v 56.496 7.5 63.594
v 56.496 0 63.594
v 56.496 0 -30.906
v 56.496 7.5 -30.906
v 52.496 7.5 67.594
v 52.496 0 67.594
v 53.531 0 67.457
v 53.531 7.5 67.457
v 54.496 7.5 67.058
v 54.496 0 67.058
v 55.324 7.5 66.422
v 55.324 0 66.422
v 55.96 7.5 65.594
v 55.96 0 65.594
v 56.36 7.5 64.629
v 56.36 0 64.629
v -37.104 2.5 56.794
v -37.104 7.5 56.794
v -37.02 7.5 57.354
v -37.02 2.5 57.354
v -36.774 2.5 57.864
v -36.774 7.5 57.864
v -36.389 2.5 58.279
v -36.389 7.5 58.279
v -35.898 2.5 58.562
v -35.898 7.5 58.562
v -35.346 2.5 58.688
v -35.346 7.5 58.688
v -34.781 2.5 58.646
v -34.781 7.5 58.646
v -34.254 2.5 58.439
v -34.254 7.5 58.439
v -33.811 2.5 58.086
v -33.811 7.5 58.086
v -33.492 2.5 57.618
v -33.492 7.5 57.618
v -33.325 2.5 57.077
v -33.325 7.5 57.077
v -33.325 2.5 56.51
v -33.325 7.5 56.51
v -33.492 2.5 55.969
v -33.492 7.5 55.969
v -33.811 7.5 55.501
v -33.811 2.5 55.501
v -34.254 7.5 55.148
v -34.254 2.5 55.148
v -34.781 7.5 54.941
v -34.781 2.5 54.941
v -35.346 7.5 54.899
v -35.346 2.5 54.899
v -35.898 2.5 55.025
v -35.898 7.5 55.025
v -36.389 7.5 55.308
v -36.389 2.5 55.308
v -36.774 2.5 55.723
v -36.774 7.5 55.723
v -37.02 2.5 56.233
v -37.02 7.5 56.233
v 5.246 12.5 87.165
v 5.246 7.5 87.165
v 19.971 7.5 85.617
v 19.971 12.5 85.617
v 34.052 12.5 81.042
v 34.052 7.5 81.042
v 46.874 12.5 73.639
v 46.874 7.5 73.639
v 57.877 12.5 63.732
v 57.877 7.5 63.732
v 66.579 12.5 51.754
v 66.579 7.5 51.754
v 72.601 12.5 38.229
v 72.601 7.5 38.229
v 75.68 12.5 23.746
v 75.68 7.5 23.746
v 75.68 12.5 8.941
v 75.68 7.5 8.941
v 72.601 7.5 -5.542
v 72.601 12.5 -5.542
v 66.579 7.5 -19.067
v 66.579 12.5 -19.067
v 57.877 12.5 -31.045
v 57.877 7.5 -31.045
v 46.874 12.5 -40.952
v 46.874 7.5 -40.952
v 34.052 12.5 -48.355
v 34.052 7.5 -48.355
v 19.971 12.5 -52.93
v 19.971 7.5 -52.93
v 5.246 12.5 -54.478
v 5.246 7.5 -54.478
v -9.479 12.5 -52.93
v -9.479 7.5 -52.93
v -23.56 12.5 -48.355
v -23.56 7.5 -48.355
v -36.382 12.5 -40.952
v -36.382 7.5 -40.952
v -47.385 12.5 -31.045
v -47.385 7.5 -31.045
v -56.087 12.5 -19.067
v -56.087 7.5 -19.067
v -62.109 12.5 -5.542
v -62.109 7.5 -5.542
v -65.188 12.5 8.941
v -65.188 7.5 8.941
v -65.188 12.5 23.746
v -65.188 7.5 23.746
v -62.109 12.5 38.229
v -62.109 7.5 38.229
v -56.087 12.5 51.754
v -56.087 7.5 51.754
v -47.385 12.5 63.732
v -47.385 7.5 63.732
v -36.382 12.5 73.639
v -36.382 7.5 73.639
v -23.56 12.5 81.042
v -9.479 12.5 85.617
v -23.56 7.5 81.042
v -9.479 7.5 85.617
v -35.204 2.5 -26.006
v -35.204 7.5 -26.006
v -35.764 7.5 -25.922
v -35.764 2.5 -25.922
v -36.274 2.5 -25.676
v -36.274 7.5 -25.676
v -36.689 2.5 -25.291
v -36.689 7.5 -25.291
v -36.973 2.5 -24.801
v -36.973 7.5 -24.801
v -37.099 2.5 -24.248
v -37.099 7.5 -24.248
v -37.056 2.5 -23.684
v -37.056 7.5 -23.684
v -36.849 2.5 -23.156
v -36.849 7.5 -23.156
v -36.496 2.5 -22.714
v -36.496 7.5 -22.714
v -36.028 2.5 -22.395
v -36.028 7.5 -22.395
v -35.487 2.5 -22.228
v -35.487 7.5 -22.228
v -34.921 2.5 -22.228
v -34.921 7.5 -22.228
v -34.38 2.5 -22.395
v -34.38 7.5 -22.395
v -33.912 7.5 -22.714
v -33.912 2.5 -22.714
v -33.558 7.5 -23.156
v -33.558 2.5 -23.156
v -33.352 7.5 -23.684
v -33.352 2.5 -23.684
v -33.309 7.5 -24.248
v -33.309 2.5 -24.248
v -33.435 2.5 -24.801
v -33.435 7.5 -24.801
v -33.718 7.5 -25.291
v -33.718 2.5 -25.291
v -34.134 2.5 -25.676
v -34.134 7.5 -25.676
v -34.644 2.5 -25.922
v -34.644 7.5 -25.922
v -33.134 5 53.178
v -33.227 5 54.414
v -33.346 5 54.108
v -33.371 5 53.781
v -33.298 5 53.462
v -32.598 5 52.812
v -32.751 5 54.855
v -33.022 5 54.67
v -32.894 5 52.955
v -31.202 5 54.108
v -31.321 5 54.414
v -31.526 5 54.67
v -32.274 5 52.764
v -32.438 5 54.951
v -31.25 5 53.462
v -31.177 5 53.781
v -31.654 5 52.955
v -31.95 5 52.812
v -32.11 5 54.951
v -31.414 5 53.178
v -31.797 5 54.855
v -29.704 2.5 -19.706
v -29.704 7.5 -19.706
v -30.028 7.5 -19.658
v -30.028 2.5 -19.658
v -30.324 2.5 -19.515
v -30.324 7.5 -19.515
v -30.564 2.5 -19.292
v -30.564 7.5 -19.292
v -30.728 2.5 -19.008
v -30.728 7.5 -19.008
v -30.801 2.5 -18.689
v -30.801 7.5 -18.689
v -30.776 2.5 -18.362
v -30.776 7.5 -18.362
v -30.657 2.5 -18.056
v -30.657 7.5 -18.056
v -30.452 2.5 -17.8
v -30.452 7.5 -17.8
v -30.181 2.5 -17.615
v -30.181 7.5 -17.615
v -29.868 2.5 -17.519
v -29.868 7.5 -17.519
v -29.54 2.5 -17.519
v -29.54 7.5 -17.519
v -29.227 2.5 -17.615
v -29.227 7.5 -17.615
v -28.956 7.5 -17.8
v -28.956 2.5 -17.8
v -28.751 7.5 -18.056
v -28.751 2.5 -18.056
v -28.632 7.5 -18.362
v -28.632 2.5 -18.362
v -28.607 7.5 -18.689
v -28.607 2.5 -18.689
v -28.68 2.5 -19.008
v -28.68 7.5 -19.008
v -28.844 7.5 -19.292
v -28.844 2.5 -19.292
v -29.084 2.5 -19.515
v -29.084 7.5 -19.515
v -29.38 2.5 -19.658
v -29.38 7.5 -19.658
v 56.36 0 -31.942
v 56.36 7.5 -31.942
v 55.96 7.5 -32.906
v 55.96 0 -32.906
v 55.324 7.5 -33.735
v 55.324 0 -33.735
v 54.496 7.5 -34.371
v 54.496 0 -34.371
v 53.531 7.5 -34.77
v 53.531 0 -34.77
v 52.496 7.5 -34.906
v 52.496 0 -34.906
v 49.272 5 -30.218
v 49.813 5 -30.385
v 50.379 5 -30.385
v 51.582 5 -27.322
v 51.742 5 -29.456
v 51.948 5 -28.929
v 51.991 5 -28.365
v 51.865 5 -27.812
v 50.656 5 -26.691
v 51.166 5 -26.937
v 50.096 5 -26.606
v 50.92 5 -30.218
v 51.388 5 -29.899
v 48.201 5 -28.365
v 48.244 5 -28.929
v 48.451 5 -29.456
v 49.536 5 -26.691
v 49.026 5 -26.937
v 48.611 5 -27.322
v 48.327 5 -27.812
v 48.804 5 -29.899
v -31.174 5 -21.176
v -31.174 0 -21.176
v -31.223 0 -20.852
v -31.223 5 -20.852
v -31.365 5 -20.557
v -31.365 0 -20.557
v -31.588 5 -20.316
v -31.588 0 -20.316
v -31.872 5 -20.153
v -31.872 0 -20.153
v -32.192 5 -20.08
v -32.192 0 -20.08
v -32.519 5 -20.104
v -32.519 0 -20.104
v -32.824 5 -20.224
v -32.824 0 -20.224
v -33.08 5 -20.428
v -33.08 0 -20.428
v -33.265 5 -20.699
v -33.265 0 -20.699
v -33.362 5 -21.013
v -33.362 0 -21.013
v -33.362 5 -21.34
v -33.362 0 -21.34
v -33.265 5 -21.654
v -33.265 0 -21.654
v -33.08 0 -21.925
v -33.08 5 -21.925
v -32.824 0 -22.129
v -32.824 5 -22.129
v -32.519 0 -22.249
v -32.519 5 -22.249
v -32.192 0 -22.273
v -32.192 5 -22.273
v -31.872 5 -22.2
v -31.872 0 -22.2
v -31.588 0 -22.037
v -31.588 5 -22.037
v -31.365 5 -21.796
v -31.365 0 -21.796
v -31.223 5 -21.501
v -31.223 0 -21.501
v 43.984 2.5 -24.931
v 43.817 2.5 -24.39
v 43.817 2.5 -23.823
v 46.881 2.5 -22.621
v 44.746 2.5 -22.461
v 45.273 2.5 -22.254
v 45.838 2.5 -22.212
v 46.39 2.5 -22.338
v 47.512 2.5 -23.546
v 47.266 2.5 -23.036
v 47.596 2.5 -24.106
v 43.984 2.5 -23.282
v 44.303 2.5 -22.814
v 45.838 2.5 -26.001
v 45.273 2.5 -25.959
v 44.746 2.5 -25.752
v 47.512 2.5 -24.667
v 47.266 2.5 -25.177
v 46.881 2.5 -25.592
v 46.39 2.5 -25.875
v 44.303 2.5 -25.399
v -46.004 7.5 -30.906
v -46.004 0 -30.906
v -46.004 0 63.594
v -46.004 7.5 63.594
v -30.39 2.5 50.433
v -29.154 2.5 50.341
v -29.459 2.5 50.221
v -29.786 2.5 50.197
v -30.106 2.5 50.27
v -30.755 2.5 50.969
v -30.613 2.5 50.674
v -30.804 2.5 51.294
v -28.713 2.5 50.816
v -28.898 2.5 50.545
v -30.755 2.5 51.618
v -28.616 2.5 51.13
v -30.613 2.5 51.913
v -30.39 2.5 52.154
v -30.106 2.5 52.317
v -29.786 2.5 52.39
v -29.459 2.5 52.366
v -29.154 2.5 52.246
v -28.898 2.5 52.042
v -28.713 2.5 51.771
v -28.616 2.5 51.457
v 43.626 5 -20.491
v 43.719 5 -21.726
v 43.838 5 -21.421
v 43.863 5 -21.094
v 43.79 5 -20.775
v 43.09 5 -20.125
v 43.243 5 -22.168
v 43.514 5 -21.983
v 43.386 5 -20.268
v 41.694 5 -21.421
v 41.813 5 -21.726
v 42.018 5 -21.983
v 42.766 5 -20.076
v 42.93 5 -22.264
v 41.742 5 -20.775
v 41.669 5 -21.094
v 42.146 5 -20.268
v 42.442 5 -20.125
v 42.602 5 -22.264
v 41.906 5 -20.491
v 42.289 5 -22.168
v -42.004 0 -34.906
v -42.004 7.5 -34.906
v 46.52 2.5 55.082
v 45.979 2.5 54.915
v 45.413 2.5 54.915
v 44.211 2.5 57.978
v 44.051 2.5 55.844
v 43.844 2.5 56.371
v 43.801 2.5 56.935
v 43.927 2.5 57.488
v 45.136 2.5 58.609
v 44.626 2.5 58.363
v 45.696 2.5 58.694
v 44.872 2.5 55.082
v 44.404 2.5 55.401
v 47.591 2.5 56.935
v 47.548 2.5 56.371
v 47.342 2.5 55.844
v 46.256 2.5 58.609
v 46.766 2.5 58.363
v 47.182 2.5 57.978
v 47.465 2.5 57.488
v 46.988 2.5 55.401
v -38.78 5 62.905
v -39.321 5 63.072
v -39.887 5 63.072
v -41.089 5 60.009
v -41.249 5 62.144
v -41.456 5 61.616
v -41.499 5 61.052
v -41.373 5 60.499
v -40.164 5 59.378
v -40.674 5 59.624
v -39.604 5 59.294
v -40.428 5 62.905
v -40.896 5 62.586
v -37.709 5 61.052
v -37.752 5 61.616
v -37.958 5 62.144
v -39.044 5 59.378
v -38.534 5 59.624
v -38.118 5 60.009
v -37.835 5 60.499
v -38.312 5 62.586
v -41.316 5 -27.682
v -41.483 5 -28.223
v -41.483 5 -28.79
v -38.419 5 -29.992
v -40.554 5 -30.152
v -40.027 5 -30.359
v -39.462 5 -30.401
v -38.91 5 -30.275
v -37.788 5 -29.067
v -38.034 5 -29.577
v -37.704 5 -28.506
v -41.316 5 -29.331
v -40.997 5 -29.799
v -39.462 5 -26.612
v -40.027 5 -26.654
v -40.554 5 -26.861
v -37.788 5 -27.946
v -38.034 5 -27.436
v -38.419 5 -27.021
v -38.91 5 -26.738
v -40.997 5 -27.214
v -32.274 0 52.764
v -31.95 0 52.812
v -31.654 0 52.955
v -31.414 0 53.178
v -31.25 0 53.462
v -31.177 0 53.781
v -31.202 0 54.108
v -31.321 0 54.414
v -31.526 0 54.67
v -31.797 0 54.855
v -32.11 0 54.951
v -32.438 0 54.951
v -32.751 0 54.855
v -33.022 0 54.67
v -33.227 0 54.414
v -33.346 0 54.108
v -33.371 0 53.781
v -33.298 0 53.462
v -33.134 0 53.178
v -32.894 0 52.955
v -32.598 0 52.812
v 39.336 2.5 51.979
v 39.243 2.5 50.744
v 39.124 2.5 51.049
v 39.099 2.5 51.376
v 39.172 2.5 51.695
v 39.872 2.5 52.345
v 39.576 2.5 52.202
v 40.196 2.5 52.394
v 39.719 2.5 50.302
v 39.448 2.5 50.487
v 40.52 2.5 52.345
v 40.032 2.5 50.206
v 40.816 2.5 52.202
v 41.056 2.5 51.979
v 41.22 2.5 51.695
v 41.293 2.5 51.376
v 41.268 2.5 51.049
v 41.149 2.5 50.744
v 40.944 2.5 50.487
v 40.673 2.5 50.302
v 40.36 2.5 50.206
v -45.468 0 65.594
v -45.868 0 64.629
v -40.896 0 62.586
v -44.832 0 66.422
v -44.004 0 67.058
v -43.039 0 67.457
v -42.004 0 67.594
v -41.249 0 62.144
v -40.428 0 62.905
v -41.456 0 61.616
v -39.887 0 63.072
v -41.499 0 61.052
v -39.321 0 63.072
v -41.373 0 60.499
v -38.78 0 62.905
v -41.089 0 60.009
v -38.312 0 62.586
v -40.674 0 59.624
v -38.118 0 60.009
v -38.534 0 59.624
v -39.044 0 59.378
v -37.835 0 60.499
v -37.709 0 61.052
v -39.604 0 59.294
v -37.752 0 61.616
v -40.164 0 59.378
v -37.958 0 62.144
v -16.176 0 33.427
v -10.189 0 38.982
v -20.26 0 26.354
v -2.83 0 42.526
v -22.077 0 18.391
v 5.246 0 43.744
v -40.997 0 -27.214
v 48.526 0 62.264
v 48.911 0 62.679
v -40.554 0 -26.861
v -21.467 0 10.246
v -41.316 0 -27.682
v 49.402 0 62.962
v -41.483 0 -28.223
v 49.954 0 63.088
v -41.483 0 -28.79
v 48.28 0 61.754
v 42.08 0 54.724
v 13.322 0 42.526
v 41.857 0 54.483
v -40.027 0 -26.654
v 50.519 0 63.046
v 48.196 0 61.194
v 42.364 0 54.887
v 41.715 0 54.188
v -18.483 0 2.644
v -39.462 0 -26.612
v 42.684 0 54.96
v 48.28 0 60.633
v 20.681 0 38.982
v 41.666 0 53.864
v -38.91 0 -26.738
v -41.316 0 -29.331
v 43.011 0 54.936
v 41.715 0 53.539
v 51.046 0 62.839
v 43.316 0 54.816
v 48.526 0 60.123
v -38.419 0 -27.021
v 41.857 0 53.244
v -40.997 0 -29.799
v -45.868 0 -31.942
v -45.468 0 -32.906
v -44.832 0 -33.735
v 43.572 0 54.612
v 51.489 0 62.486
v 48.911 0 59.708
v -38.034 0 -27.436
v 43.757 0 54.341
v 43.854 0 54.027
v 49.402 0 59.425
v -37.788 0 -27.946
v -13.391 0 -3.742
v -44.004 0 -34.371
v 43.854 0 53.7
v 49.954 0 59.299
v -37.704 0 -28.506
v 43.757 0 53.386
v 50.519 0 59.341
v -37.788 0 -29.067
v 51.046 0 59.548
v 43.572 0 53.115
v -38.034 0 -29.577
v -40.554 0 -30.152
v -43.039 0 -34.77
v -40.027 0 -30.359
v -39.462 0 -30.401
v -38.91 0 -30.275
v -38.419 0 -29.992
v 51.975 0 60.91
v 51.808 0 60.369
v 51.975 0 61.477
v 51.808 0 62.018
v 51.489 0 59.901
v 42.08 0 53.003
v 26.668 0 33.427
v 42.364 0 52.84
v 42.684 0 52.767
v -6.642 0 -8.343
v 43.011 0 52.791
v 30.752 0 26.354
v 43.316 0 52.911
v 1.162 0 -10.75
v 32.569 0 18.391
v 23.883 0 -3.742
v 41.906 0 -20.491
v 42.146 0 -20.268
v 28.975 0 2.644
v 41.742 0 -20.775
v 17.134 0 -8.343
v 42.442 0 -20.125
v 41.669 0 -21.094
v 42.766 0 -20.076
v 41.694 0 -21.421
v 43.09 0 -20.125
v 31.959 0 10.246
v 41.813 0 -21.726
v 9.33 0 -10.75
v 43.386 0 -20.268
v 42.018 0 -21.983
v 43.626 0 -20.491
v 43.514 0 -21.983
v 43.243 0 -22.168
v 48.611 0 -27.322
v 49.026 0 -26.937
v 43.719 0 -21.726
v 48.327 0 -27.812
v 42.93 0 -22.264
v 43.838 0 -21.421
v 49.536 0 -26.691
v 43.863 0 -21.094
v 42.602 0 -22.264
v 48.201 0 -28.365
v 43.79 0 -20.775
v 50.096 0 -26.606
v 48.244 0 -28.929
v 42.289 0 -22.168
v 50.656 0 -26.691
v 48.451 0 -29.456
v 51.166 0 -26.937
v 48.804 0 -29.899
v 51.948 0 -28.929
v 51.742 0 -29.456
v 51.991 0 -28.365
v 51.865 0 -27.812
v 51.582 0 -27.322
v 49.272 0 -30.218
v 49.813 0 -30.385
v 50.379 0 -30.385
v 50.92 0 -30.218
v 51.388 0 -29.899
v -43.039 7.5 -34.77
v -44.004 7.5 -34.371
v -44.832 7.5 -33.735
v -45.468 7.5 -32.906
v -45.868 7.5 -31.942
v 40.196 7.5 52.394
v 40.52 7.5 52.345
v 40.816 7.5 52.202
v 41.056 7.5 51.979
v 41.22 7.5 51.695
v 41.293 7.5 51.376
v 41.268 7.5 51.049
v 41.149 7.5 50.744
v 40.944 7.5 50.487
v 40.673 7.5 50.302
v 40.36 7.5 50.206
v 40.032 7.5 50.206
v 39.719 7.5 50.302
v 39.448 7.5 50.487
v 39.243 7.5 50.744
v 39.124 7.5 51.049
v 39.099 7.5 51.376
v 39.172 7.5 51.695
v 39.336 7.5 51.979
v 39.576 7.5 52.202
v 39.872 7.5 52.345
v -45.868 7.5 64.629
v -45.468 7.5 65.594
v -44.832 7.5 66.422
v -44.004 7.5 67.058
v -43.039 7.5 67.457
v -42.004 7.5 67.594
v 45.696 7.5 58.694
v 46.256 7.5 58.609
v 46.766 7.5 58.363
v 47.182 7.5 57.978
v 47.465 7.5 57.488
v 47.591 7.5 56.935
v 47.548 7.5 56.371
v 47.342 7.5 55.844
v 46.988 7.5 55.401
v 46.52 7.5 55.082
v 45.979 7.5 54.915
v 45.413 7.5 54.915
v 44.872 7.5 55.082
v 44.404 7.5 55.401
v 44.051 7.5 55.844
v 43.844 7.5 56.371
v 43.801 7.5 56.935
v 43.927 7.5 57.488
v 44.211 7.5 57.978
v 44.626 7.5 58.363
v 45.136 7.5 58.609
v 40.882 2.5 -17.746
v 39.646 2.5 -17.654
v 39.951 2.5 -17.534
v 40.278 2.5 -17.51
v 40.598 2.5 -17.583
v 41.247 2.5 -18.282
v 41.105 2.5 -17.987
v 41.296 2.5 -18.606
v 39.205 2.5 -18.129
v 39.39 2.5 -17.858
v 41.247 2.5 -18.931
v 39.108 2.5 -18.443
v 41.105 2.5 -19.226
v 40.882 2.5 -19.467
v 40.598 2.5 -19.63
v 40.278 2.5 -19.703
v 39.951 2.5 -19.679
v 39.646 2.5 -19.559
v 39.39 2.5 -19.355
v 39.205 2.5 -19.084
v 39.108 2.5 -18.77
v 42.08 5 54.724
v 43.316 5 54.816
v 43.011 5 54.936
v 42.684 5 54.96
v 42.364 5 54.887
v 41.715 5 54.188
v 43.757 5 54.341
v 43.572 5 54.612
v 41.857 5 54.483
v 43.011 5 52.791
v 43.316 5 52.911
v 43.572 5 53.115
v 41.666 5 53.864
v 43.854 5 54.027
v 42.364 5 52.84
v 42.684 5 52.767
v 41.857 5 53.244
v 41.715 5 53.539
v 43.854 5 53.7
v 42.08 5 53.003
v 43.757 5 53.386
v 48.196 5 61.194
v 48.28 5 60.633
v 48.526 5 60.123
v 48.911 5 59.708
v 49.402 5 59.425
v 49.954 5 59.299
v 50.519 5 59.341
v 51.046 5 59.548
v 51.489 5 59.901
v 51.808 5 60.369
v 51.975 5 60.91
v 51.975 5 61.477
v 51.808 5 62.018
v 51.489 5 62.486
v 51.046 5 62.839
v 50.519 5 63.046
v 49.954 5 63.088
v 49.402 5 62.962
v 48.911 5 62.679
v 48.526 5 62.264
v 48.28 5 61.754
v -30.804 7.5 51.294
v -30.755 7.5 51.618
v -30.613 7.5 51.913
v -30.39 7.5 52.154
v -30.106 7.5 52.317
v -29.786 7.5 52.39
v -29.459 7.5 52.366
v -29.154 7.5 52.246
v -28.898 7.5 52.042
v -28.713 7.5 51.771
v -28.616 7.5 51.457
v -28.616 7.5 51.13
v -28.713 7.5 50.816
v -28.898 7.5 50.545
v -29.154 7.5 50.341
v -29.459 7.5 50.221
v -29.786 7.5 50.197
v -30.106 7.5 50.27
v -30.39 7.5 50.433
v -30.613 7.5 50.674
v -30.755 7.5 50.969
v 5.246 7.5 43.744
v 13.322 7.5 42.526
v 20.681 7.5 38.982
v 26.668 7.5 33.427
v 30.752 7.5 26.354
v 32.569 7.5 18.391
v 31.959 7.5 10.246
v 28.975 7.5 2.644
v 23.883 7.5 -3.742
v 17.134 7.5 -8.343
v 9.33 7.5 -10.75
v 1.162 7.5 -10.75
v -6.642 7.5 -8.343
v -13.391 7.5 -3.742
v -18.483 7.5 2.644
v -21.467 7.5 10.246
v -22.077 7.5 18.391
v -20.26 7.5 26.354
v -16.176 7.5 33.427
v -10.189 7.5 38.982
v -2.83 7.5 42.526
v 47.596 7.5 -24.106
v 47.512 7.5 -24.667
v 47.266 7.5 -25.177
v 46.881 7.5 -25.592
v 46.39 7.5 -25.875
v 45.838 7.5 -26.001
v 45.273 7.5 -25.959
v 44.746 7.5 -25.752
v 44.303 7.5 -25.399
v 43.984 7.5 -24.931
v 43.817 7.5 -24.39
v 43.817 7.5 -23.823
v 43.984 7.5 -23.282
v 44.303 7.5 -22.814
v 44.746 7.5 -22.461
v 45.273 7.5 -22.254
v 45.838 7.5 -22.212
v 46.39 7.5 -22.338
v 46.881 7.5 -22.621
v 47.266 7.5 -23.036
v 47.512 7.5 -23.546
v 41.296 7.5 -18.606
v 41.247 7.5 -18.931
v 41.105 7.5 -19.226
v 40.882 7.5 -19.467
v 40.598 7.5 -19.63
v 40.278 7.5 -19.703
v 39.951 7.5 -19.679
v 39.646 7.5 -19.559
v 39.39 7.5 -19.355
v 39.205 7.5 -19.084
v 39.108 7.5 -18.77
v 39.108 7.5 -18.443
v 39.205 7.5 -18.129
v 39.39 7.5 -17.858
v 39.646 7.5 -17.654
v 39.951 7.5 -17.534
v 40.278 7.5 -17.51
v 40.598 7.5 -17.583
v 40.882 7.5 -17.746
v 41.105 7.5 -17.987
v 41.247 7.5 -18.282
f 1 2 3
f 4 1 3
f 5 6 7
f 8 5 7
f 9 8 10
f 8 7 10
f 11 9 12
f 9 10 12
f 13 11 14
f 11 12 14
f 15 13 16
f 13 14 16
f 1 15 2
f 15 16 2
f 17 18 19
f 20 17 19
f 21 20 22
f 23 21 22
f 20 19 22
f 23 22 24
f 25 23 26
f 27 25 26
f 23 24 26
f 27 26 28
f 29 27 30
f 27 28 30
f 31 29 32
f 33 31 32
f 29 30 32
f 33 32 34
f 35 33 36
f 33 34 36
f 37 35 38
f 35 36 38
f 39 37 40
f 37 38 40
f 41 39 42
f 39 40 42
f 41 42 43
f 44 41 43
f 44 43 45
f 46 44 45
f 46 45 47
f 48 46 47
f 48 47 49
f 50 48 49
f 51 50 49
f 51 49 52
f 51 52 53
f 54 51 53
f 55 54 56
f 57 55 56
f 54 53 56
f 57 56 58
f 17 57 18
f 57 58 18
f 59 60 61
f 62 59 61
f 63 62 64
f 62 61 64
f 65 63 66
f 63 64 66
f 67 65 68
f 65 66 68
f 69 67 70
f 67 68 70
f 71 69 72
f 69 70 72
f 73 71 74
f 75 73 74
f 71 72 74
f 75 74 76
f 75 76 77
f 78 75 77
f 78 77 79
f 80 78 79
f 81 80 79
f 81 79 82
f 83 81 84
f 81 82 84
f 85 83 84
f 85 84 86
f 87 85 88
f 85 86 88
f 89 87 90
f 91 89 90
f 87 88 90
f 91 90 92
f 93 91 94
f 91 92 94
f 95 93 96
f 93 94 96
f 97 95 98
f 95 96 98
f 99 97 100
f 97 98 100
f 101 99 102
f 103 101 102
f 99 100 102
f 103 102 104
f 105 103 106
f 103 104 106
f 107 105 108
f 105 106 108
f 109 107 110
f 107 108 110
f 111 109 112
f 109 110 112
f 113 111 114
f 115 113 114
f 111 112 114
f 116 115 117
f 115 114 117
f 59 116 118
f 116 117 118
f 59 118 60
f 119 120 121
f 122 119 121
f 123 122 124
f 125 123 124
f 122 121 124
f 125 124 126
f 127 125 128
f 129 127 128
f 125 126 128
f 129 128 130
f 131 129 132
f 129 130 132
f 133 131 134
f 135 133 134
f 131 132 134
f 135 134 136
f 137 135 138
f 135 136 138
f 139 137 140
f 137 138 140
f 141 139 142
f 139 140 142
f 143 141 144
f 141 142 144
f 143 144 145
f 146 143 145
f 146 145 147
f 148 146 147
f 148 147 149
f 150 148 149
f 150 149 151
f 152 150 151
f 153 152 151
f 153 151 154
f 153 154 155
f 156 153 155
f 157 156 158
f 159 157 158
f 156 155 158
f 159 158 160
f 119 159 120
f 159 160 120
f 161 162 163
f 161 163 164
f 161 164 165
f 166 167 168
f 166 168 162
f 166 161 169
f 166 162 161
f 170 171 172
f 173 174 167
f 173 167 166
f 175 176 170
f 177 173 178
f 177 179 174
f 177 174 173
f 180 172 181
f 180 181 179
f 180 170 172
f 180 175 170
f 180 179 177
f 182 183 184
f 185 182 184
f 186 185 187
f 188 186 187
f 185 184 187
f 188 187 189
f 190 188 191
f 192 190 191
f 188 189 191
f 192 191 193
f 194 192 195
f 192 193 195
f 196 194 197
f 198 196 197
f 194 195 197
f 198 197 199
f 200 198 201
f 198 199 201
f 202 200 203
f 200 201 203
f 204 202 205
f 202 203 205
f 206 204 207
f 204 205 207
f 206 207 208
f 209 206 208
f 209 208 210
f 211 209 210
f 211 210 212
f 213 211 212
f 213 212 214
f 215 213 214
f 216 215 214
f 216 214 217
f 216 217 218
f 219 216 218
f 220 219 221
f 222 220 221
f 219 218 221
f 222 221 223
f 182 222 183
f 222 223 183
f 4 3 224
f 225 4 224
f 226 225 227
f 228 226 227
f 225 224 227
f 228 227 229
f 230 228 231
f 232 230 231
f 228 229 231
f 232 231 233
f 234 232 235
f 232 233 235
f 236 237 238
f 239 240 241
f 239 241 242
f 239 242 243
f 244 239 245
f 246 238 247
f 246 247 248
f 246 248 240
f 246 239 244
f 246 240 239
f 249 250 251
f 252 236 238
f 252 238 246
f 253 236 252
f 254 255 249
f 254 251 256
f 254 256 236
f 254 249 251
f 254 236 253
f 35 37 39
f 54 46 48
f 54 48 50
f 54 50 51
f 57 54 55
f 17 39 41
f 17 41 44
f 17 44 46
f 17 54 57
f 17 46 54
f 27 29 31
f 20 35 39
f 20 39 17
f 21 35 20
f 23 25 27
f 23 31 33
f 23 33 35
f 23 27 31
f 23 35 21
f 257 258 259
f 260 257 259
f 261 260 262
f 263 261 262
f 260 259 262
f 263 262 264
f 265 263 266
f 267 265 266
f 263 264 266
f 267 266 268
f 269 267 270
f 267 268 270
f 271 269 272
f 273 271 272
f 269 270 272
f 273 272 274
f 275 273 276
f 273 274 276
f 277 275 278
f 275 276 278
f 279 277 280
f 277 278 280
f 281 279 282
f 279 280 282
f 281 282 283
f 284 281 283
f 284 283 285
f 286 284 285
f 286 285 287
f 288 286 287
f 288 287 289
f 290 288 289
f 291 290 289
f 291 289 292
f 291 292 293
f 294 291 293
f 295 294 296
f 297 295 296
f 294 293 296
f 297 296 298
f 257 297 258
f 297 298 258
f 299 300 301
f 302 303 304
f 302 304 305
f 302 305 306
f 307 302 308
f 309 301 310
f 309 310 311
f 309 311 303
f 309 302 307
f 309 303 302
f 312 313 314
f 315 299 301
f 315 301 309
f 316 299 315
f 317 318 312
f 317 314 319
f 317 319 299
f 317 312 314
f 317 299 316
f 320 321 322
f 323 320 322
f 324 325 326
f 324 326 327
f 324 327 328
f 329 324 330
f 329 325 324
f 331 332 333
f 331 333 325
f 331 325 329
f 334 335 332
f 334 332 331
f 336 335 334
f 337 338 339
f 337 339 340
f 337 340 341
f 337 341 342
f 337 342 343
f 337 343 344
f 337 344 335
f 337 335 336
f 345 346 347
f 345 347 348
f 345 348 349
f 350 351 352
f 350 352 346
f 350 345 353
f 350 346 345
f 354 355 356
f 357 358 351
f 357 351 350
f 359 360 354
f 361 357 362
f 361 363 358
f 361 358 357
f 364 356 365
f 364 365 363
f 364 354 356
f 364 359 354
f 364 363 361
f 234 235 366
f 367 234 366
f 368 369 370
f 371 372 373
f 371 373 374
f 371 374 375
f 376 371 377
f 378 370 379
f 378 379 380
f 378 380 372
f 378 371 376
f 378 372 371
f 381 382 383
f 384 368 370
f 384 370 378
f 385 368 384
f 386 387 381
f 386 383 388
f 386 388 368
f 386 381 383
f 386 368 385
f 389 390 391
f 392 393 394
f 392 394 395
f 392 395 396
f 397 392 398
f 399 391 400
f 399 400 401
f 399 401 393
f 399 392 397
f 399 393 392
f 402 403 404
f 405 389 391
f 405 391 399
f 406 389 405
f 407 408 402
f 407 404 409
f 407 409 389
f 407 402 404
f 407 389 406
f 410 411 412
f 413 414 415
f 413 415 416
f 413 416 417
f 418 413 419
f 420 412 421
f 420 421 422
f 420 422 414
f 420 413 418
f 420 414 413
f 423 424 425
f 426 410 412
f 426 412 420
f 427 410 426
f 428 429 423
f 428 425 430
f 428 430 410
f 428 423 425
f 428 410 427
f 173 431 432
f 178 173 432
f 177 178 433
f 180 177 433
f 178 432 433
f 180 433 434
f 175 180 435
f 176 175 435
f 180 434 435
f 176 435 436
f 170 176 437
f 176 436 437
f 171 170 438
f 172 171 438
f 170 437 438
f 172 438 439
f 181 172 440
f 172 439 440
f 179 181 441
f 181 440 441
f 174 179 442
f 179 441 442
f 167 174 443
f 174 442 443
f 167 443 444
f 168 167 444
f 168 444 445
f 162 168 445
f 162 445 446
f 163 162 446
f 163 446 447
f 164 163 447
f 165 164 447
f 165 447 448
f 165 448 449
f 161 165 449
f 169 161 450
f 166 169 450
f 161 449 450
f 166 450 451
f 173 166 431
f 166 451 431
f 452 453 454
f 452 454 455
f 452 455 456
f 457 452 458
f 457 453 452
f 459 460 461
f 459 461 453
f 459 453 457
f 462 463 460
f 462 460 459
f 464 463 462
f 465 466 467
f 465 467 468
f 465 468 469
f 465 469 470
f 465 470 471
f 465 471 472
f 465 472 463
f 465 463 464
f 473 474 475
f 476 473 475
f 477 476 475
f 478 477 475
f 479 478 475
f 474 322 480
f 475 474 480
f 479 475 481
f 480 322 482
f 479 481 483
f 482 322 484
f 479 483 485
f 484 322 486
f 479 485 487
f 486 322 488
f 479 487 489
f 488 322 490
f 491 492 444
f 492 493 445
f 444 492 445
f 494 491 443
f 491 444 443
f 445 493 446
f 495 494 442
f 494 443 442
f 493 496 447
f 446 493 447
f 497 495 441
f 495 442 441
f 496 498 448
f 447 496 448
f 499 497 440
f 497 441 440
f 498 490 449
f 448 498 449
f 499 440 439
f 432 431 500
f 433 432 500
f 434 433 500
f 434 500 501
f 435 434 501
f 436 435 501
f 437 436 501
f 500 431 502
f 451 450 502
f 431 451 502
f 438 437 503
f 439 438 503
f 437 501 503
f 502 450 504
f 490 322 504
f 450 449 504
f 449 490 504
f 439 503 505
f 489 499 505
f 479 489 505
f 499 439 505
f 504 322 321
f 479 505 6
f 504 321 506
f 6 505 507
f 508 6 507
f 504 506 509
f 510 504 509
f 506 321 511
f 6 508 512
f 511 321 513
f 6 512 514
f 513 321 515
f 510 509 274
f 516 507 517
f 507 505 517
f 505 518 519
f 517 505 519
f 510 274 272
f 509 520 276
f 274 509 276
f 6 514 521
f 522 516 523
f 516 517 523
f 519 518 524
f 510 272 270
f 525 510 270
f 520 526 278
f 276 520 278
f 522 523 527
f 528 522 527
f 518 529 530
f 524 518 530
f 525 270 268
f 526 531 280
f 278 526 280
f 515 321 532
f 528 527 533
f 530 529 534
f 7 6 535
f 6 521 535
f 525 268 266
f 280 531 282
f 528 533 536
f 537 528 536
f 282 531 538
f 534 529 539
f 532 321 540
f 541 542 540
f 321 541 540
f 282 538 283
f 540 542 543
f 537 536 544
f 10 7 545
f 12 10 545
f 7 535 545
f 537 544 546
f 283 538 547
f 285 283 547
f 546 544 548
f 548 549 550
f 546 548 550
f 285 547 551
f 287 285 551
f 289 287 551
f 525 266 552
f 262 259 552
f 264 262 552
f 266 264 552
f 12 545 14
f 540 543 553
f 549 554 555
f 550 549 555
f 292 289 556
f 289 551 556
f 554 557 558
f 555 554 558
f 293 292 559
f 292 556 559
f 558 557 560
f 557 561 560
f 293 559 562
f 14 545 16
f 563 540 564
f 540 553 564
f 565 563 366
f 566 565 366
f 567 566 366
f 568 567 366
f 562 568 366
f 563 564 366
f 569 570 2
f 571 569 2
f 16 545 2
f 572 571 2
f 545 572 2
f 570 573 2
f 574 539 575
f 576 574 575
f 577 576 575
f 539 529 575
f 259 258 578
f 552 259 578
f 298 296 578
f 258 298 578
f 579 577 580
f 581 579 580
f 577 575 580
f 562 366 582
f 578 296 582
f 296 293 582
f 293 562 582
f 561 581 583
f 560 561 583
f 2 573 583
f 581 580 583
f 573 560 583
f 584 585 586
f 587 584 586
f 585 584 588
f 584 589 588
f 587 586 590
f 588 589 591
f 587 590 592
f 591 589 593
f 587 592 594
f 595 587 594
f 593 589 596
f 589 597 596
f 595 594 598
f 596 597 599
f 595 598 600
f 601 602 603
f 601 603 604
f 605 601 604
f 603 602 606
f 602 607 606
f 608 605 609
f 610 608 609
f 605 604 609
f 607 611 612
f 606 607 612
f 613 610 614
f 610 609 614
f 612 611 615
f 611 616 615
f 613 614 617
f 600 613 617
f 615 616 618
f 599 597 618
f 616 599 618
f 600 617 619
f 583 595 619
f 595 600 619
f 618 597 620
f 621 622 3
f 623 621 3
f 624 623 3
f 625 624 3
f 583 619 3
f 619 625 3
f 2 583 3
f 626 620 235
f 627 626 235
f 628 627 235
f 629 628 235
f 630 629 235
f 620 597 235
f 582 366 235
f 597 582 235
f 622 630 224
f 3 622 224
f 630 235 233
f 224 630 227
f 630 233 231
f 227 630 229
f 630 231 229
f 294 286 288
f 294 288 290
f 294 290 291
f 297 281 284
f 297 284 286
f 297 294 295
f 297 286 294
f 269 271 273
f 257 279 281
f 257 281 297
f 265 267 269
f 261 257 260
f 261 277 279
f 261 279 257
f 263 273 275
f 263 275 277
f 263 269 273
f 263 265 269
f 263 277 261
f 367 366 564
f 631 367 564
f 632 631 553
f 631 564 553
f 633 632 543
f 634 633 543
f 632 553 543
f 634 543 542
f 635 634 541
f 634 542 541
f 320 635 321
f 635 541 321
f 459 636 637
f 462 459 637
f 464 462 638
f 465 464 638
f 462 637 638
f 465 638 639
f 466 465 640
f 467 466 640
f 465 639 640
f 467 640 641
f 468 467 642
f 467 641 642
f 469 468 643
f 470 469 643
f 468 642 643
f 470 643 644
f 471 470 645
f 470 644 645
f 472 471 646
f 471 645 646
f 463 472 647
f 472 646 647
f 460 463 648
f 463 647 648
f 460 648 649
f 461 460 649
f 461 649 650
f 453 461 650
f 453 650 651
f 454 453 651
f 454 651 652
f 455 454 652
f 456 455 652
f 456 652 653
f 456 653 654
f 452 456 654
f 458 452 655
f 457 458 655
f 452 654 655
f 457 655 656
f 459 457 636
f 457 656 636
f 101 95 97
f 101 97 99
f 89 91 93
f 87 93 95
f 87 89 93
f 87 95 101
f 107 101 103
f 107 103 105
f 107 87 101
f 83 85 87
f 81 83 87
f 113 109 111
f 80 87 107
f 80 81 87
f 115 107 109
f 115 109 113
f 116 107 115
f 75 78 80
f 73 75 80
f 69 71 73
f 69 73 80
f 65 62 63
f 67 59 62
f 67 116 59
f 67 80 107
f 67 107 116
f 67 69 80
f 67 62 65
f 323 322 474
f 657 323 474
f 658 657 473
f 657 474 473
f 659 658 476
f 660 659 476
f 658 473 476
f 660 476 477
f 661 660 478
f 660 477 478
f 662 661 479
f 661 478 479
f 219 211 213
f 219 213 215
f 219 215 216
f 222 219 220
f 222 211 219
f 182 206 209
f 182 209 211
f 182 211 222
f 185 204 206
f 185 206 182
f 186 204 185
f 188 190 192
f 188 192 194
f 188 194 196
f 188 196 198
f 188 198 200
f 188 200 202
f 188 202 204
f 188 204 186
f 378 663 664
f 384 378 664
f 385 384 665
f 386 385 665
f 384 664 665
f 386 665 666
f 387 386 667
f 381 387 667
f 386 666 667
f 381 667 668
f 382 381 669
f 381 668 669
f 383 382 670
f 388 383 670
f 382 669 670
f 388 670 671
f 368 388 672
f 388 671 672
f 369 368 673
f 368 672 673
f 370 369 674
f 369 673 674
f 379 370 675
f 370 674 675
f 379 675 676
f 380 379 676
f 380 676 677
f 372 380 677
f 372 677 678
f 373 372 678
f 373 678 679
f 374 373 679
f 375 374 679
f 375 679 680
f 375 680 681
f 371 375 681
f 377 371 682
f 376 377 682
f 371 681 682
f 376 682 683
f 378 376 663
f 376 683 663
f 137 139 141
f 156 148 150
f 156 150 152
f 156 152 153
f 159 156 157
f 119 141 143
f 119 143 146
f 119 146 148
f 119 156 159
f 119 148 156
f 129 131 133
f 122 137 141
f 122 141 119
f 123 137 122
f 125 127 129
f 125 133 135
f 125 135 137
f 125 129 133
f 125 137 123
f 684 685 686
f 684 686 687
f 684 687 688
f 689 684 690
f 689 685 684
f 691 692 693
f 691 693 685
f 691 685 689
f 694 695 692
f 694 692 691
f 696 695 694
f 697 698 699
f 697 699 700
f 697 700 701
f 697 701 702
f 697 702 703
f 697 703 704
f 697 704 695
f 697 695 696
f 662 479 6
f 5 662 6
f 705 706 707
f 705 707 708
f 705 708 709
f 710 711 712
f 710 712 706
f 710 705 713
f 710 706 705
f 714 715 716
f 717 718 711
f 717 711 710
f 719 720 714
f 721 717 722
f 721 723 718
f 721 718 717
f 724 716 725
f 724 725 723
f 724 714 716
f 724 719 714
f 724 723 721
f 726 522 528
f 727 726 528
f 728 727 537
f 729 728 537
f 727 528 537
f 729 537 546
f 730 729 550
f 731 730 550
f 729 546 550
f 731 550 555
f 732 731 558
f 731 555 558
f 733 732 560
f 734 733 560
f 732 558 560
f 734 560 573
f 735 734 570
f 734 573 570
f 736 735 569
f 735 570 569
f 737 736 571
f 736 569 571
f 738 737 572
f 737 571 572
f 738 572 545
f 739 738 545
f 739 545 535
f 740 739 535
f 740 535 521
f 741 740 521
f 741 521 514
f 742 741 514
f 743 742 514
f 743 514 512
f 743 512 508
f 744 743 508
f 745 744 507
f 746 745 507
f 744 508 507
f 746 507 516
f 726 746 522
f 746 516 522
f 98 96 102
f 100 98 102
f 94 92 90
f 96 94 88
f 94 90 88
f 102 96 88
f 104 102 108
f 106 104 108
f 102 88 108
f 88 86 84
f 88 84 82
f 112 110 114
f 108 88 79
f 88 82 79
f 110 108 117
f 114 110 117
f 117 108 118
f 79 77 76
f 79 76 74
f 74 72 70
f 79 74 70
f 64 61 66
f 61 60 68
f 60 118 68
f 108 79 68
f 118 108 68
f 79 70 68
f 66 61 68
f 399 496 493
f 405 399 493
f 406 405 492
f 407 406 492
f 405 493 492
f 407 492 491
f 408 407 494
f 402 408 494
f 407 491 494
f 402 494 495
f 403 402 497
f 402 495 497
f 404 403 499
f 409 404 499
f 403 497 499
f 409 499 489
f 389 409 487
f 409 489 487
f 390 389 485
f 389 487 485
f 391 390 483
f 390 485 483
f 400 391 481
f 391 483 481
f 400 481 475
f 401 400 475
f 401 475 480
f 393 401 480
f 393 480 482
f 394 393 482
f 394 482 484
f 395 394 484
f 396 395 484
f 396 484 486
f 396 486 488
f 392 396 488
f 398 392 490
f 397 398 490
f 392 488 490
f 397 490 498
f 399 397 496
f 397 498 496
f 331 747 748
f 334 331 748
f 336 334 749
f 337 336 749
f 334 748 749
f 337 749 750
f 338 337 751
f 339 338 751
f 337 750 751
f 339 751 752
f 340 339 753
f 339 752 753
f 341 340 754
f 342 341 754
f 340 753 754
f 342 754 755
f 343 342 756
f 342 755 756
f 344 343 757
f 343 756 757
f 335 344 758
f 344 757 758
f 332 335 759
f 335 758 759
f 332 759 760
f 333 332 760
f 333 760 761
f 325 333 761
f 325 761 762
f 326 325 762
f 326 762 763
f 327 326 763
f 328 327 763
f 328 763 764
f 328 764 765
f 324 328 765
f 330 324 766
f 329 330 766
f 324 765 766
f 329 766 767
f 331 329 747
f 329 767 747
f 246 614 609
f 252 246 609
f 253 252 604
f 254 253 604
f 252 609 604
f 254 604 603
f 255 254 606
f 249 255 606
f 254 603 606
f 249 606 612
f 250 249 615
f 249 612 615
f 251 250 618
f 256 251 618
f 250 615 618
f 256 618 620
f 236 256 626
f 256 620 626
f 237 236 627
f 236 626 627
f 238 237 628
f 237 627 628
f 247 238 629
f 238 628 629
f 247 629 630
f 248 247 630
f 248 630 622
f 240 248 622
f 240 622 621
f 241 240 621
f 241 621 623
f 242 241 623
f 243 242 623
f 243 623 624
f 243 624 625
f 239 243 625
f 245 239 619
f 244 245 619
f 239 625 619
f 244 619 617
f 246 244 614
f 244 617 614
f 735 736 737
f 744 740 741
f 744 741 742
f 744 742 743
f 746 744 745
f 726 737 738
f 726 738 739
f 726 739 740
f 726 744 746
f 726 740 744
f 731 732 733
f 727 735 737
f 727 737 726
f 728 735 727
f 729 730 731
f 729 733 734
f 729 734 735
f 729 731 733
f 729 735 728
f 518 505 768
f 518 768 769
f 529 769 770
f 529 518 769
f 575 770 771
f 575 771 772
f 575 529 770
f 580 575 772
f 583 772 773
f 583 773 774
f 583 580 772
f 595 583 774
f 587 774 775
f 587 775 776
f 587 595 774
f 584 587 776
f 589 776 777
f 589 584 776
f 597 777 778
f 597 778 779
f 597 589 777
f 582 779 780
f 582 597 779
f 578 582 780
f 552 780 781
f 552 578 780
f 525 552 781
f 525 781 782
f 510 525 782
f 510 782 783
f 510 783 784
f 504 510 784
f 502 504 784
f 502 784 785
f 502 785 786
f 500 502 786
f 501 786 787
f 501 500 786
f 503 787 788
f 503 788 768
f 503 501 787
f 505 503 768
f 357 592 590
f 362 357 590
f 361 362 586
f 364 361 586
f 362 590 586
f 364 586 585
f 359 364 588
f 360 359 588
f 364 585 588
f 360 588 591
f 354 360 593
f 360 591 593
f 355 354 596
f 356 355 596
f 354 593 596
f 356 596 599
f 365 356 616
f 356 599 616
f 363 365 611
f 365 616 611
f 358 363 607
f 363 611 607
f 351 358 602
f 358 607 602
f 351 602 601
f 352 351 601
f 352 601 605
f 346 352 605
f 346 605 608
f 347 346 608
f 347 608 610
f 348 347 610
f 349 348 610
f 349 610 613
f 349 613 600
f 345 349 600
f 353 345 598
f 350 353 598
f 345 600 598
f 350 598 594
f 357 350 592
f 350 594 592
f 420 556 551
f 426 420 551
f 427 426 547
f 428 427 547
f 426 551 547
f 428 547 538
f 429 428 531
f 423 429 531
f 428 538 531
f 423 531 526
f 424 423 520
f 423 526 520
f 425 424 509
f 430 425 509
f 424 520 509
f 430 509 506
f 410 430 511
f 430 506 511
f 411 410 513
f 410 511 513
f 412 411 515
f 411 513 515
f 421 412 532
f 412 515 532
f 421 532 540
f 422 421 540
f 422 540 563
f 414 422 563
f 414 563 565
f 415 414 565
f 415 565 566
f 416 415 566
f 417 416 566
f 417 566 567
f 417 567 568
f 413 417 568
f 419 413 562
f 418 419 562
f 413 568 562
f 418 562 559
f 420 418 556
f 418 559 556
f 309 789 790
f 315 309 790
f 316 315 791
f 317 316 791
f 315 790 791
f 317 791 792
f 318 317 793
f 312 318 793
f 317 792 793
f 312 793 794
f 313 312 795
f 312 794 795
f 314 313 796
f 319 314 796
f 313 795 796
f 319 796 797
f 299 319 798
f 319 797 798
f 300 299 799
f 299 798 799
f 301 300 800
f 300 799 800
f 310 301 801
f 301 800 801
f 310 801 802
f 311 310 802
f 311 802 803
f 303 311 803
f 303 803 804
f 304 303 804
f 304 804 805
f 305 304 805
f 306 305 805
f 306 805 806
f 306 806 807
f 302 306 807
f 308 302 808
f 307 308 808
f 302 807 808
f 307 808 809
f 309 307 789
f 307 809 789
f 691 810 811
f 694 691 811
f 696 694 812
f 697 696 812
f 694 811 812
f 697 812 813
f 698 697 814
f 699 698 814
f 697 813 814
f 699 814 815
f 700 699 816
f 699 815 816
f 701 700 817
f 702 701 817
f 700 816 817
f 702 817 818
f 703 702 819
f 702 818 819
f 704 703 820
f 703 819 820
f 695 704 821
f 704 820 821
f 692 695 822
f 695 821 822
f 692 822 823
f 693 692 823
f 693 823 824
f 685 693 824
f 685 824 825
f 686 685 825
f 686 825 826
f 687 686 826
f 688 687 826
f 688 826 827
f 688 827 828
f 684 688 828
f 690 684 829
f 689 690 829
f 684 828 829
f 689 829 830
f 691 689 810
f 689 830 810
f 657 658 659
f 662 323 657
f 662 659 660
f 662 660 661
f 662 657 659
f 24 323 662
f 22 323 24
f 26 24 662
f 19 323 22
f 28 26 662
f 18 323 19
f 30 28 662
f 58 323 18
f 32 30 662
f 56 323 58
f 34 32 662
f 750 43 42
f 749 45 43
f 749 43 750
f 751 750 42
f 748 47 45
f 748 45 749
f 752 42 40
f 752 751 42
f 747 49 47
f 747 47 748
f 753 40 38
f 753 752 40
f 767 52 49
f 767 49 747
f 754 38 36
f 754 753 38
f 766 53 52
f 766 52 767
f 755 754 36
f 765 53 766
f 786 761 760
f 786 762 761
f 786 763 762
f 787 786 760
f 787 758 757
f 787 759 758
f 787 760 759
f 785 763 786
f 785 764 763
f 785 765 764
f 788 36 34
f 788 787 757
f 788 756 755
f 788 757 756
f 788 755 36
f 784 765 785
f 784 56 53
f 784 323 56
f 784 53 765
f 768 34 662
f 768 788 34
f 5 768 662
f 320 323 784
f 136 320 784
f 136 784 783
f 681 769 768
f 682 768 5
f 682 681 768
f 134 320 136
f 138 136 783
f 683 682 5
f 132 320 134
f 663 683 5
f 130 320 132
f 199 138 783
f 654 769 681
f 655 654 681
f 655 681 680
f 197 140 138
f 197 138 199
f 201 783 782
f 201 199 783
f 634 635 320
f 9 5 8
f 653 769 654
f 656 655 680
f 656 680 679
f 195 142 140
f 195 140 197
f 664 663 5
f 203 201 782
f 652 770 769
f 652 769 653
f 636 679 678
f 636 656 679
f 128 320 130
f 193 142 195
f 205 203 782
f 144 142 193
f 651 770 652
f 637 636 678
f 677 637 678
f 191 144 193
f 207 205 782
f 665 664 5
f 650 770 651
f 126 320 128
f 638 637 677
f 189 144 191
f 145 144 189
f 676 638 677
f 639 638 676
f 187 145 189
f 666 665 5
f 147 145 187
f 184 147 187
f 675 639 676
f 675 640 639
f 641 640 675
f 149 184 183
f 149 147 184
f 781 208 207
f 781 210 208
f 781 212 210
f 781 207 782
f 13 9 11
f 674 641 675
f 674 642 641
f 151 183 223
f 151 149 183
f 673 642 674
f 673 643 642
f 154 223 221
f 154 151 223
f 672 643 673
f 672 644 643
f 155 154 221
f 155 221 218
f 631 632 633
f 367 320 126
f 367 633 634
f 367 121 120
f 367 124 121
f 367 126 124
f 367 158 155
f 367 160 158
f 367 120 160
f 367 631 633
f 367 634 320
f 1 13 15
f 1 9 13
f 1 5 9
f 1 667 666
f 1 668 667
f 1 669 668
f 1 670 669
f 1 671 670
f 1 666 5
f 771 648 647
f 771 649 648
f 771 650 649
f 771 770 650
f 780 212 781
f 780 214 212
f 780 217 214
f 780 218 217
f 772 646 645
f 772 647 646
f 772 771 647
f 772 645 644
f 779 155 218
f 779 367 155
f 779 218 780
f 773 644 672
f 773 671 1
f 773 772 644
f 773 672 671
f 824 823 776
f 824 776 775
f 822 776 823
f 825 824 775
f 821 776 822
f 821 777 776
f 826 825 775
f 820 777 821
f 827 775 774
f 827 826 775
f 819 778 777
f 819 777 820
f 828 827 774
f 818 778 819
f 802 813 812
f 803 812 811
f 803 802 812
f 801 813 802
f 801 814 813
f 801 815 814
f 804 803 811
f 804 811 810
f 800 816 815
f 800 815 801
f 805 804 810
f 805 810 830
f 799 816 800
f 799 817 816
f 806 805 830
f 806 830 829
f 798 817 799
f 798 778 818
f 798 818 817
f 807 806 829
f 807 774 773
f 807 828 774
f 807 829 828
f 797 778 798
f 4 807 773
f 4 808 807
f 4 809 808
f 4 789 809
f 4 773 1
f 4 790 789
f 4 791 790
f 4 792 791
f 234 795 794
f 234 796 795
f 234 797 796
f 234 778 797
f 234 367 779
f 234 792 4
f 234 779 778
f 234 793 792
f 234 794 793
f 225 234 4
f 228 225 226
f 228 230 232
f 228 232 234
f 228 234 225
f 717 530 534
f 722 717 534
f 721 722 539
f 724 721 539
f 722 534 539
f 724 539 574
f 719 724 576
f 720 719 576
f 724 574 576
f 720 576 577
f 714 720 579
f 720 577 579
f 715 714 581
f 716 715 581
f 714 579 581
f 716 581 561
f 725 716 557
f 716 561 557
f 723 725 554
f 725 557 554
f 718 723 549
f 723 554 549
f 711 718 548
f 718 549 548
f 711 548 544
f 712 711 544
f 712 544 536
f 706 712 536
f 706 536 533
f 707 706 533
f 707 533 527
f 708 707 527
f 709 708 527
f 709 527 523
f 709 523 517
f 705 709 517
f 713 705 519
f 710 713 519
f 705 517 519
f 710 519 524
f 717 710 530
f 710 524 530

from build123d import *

# Parameters (mm, degrees)
BOSS_EXTRUDE1_DEPTH = 7.5
SKETCH4_R           = 70.821590822
BOSS_EXTRUDE3_DEPTH = 5
SKETCH5_R           = 1.9
SKETCH5_R_2         = 1.1
CUT_EXTRUDE1_DEPTH  = 5
CIRPATTERN1_COUNT   = 4
SKETCH7_R           = 1.9
SKETCH7_R_2         = 1.1
CUT_EXTRUDE2_DEPTH  = 5
CIRPATTERN2_COUNT   = 4


with BuildPart() as part:
    # Sketch1 → Boss-Extrude1 (new body)
    with BuildSketch(Plane(origin=(0, 0, 0), x_dir=(1, 0, 0), z_dir=(0, 1, 0))):
        with BuildLine():
            ThreePointArc((-42.003937008, 34.906496063), (-44.832364133, 33.734923188), (-46.003937008, 30.906496063))
            Line((-46.003937008, 30.906496063), (-46.003937008, -63.593503937))
            ThreePointArc((-46.003937008, -63.593503937), (-44.832364133, -66.421931062), (-42.003937008, -67.593503937))
            Line((-42.003937008, -67.593503937), (52.496062992, -67.593503937))
            ThreePointArc((52.496062992, -67.593503937), (55.324490117, -66.421931062), (56.496062992, -63.593503937))
            Line((56.496062992, -63.593503937), (56.496062992, 30.906496063))
            ThreePointArc((56.496062992, 30.906496063), (55.324490117, 33.734923188), (52.496062992, 34.906496063))
            Line((52.496062992, 34.906496063), (-42.003937008, 34.906496063))
        make_face()
        with BuildLine():
            ThreePointArc((-14.128662812, 3.031221868), (5.246062992, 11.056496063), (24.620788797, 3.031221868))
            ThreePointArc((24.620788797, 3.031221868), (30.560362183, -5.85797789), (32.646062992, -16.343503937))
            ThreePointArc((32.646062992, -16.343503937), (15.731589039, -41.657803128), (-14.128662812, -35.718229742))
            ThreePointArc((-14.128662812, -35.718229742), (-22.153937008, -16.343503937), (-14.128662812, 3.031221868))
        make_face(mode=Mode.SUBTRACT)
    extrude(amount=BOSS_EXTRUDE1_DEPTH)

    # Sketch5 → Cut-Extrude1 (cut)
    with BuildSketch(Plane(origin=(0, 7.5, 0), x_dir=(1, 0, 0), z_dir=(0, 1, 0))):
        with Locations((45.696062992, -56.793503937)):
            Circle(SKETCH5_R)
        with Locations((40.196062992, -51.293503937)):
            Circle(SKETCH5_R_2)
    cut_extrude1 = extrude(amount=-CUT_EXTRUDE1_DEPTH, mode=Mode.SUBTRACT)

    # CirPattern1: Cut-Extrude1 ×4 about axis
    cirpattern1_axis = Axis((5.246062992, 121.392189585, 16.343503937), (0, -1, 0))
    for i in range(1, CIRPATTERN1_COUNT):
        add(cut_extrude1.rotate(cirpattern1_axis, i * 360 / CIRPATTERN1_COUNT), mode=Mode.SUBTRACT)

    # Sketch7 → Cut-Extrude2 (cut)
    with BuildSketch(Plane(origin=(0, 0, 0), x_dir=(-1, 0, 0), z_dir=(0, -1, 0))):
        with Locations((39.603937008, -61.193503937)):
            Circle(SKETCH7_R)
        with Locations((32.273937008, -53.863503937)):
            Circle(SKETCH7_R_2)
    cut_extrude2 = extrude(amount=-CUT_EXTRUDE2_DEPTH, mode=Mode.SUBTRACT)

    # CirPattern2: Cut-Extrude2 ×4 about axis
    cirpattern2_axis = Axis((5.246062992, 121.392189585, 16.343503937), (0, -1, 0))
    for i in range(1, CIRPATTERN2_COUNT):
        add(cut_extrude2.rotate(cirpattern2_axis, i * 360 / CIRPATTERN2_COUNT), mode=Mode.SUBTRACT)


with BuildPart() as body_2:
    # Sketch4 → Boss-Extrude3 (new body)
    with BuildSketch(Plane(origin=(0, 7.5, 0), x_dir=(1, 0, 0), z_dir=(0, 1, 0))):
        with Locations((5.246062992, -16.343503937)):
            Circle(SKETCH4_R)
    extrude(amount=BOSS_EXTRUDE3_DEPTH)


solid = Compound([part.part, body_2.part])
